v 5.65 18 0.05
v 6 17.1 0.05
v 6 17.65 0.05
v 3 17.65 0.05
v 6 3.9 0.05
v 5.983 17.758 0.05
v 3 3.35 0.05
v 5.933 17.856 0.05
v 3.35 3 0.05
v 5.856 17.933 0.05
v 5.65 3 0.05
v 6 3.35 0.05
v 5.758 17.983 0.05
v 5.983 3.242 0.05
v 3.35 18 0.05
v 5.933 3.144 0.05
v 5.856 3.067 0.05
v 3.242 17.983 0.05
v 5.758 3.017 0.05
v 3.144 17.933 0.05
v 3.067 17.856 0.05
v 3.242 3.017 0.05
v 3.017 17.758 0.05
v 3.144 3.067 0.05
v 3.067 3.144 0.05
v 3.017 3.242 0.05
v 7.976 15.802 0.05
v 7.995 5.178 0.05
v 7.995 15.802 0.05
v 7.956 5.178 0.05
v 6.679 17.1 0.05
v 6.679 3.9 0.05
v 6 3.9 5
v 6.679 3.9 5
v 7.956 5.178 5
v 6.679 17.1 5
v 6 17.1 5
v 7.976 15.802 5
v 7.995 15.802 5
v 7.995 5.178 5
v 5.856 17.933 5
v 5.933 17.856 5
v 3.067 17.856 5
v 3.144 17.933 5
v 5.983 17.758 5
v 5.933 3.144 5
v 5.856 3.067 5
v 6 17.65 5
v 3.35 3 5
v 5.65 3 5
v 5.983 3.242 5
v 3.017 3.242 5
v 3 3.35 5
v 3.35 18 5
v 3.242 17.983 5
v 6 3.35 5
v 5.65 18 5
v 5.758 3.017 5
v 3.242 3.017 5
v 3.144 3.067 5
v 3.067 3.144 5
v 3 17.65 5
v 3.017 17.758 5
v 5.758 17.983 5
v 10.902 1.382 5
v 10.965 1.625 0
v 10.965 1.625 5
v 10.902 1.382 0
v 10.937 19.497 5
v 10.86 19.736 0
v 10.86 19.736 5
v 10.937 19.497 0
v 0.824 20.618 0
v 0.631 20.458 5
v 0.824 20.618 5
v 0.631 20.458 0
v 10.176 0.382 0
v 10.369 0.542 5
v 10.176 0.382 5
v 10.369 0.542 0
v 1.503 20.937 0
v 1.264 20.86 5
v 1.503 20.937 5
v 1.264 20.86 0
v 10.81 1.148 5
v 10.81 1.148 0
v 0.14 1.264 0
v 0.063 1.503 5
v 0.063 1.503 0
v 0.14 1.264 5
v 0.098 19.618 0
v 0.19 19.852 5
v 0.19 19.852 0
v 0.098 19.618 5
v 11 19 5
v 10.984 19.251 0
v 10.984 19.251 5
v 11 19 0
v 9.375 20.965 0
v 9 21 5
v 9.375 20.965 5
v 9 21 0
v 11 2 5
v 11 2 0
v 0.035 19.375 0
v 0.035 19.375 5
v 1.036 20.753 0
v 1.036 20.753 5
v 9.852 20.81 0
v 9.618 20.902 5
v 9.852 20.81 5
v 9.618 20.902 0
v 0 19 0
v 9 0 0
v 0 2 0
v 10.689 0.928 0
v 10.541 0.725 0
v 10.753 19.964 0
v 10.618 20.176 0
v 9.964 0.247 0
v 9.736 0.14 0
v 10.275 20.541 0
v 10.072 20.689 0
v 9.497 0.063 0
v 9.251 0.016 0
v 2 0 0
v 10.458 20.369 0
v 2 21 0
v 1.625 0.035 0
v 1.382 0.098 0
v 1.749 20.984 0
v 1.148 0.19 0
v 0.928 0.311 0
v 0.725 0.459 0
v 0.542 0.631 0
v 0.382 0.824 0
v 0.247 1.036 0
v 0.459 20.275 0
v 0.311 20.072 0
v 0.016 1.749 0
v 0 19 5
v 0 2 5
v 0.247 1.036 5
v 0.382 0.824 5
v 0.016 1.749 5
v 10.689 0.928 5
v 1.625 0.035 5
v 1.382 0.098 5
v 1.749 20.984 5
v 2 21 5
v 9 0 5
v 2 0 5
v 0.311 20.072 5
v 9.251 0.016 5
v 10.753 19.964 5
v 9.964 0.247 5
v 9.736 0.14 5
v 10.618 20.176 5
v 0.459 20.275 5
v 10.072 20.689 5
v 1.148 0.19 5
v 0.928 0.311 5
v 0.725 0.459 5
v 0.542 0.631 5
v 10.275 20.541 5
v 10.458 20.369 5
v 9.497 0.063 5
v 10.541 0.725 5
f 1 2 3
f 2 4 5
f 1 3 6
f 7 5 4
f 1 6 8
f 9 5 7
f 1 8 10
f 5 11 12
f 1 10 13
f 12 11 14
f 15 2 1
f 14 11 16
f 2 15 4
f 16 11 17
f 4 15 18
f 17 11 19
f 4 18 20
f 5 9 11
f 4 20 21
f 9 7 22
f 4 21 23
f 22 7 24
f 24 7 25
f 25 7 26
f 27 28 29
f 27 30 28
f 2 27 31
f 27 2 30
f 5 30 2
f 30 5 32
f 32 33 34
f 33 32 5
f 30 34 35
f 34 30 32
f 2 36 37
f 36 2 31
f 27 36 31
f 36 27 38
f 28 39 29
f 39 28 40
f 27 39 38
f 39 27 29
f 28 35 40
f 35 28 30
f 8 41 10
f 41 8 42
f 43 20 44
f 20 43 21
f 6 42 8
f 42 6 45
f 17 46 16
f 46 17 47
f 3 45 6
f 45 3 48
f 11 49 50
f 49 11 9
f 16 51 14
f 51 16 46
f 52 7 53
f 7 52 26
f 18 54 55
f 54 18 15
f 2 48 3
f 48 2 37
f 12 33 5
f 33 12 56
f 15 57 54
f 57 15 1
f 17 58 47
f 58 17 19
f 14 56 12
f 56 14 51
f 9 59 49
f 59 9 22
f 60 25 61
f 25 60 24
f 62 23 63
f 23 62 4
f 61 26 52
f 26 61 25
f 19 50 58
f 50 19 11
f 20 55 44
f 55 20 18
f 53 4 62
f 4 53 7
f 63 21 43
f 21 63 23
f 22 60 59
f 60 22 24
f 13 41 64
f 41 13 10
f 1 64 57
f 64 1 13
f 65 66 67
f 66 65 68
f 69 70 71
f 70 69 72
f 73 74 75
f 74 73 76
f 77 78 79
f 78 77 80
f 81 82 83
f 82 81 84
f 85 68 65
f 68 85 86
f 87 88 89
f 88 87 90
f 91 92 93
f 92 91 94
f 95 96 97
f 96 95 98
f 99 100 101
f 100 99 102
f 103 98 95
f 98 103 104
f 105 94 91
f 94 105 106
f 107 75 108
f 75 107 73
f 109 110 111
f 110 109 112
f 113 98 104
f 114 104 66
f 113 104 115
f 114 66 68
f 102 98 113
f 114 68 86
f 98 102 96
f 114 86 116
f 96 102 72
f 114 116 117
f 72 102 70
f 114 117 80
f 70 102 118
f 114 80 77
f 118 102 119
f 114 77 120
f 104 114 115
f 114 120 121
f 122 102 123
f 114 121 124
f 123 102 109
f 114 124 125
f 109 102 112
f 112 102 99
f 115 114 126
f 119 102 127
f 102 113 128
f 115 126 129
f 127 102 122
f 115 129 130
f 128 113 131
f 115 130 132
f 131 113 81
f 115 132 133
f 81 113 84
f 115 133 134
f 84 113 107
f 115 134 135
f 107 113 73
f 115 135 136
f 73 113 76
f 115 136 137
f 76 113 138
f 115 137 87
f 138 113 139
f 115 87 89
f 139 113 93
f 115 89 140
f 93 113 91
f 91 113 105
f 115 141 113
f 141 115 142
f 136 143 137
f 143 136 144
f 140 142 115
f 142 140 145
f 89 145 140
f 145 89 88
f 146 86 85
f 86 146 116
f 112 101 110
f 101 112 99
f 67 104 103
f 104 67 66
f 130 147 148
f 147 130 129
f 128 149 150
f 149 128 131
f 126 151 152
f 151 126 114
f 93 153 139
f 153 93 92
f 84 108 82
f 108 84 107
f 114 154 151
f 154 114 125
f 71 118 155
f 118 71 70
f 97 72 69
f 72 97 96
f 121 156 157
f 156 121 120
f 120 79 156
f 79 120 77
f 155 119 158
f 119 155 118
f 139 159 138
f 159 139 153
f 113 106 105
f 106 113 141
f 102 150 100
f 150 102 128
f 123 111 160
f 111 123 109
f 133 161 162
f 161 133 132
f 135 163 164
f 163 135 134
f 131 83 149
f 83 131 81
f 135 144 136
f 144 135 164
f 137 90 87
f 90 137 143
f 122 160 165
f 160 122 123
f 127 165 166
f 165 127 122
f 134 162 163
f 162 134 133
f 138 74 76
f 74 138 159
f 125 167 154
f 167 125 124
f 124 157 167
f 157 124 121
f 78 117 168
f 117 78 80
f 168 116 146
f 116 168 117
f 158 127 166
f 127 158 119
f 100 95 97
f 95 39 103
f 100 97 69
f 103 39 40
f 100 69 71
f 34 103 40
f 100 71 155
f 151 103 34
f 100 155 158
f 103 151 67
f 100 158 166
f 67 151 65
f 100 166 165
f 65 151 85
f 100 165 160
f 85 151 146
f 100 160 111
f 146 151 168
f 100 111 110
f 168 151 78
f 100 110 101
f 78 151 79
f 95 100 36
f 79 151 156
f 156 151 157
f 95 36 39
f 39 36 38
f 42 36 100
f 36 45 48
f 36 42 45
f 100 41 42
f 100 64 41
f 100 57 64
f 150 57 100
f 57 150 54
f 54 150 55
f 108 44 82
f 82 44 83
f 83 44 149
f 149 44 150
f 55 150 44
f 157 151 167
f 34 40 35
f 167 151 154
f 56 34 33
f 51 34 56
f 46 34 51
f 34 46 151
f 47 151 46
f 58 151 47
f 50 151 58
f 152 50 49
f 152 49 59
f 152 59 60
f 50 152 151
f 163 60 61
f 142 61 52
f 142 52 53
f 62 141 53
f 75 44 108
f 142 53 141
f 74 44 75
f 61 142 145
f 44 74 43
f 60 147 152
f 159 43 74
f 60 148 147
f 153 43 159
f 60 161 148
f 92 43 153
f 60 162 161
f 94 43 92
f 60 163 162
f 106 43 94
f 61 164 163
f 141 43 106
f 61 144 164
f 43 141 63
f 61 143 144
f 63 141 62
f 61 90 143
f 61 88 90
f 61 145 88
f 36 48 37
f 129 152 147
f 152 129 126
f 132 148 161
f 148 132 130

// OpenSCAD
// file: hdmi_plug.scad
// Specs from: http://media.digikey.com/pdf/Data%20Sheets/Hirose%20PDFs/MD_Series.pdf
$fn=20;

hdmi_plug_depth=10;
hdmi_plug_width=15;
hdmi_plug_height=5;

function hdmi_depth() = hdmi_plug_depth;
function hdmi_width() = hdmi_plug_width;
function hdmi_height() = hdmi_plug_height;

hdmi_plug_top_height=3;
hdmi_plug_bottom_height=hdmi_plug_height-hdmi_plug_top_height;
hdmi_plug_bevel_width=1.3;

rounding_radius=0.35;
top_unrounded_height=hdmi_plug_top_height-(2*rounding_radius);
top_unrounded_width=hdmi_plug_width-(2*rounding_radius);
bottom_square_width=10.6;
bottom_bevel_hypotenuse=1.84;

diff_buffer=0.2;

module hdmi_upper(){
    translate([-(hdmi_plug_depth/2),-(top_unrounded_width/2),rounding_radius])
        rotate([90,0,90]) 
            linear_extrude(height=hdmi_plug_depth){
                offset(r=rounding_radius) square([top_unrounded_width,top_unrounded_height]);
            }
//    translate([0,0,2.25]) cube([10.9,15.1,4.5], center=true);
}

module hdmi_lower_side(){
    translate([0,-(hdmi_plug_bevel_width/2),(hdmi_plug_bottom_height/2) + 0.01])
    difference(){
        cube([hdmi_plug_depth, hdmi_plug_bevel_width, hdmi_plug_bottom_height], center=true);
        translate([0,-(hdmi_plug_bevel_width/2),-(hdmi_plug_bottom_height/2)]) 
            rotate([-45,0,0]) 
                cube([(hdmi_plug_depth + diff_buffer),bottom_bevel_hypotenuse,bottom_bevel_hypotenuse], center=true);
    }
}

module hdmi_lower(){
    translate([0,-(bottom_square_width/2),-(hdmi_plug_bottom_height)+0.01])
    union(){
        translate([0,0,0])
            hdmi_lower_side();
        translate([0,(bottom_square_width/2)-0.01,(hdmi_plug_bottom_height/2)])
            cube([hdmi_plug_depth,bottom_square_width+0.025,hdmi_plug_bottom_height+0.01],center=true);
        translate([0,bottom_square_width,0]) 
            rotate([0,0,180])
                hdmi_lower_side();
    }
}

module hdmi_plug(){
    translate([0,0,-((hdmi_plug_top_height/2)-(hdmi_plug_bottom_height/2))])
        union(){
            hdmi_upper();
            hdmi_lower();
        }
}

hdmi_plug();
// main file
use <hdmi_plug.scad>;

$fn=50;

container_depth=hdmi_depth() /2; //testing fit, should be +2;
container_width=hdmi_width() +2;
container_height=hdmi_height() + 2;

rounding_radius=2;

module hdmi_socket(){
    translate([-((container_depth-hdmi_depth())*.51),0,0])
        difference(){
            translate([(container_depth - hdmi_depth())*.51,0,0])
                cube([container_depth, container_width, container_height], center=true);
            hdmi_plug();
        }
}

module hdmi_socket_rounded(){
    translate([-((container_depth-hdmi_depth())*.51),0,0])
        difference(){
            translate([(container_depth - hdmi_depth())*.51,0,-(container_height/2)-rounding_radius])
                translate([-(container_depth/2),-(container_width/2),rounding_radius])
                    rotate([90,0,90])
                        linear_extrude(height=container_depth){
                            offset(r=rounding_radius) square([container_width,container_height]);
                    }
            hdmi_plug();
        }
}


translate([(container_height/2)+rounding_radius, (container_width/2)+rounding_radius, container_depth/2])
    rotate([0,-90,0])
        hdmi_socket_rounded();
 
//translate([container_height/2, container_width/2, container_depth/2])
//    rotate([0,90,0])
//        hdmi_socket();
